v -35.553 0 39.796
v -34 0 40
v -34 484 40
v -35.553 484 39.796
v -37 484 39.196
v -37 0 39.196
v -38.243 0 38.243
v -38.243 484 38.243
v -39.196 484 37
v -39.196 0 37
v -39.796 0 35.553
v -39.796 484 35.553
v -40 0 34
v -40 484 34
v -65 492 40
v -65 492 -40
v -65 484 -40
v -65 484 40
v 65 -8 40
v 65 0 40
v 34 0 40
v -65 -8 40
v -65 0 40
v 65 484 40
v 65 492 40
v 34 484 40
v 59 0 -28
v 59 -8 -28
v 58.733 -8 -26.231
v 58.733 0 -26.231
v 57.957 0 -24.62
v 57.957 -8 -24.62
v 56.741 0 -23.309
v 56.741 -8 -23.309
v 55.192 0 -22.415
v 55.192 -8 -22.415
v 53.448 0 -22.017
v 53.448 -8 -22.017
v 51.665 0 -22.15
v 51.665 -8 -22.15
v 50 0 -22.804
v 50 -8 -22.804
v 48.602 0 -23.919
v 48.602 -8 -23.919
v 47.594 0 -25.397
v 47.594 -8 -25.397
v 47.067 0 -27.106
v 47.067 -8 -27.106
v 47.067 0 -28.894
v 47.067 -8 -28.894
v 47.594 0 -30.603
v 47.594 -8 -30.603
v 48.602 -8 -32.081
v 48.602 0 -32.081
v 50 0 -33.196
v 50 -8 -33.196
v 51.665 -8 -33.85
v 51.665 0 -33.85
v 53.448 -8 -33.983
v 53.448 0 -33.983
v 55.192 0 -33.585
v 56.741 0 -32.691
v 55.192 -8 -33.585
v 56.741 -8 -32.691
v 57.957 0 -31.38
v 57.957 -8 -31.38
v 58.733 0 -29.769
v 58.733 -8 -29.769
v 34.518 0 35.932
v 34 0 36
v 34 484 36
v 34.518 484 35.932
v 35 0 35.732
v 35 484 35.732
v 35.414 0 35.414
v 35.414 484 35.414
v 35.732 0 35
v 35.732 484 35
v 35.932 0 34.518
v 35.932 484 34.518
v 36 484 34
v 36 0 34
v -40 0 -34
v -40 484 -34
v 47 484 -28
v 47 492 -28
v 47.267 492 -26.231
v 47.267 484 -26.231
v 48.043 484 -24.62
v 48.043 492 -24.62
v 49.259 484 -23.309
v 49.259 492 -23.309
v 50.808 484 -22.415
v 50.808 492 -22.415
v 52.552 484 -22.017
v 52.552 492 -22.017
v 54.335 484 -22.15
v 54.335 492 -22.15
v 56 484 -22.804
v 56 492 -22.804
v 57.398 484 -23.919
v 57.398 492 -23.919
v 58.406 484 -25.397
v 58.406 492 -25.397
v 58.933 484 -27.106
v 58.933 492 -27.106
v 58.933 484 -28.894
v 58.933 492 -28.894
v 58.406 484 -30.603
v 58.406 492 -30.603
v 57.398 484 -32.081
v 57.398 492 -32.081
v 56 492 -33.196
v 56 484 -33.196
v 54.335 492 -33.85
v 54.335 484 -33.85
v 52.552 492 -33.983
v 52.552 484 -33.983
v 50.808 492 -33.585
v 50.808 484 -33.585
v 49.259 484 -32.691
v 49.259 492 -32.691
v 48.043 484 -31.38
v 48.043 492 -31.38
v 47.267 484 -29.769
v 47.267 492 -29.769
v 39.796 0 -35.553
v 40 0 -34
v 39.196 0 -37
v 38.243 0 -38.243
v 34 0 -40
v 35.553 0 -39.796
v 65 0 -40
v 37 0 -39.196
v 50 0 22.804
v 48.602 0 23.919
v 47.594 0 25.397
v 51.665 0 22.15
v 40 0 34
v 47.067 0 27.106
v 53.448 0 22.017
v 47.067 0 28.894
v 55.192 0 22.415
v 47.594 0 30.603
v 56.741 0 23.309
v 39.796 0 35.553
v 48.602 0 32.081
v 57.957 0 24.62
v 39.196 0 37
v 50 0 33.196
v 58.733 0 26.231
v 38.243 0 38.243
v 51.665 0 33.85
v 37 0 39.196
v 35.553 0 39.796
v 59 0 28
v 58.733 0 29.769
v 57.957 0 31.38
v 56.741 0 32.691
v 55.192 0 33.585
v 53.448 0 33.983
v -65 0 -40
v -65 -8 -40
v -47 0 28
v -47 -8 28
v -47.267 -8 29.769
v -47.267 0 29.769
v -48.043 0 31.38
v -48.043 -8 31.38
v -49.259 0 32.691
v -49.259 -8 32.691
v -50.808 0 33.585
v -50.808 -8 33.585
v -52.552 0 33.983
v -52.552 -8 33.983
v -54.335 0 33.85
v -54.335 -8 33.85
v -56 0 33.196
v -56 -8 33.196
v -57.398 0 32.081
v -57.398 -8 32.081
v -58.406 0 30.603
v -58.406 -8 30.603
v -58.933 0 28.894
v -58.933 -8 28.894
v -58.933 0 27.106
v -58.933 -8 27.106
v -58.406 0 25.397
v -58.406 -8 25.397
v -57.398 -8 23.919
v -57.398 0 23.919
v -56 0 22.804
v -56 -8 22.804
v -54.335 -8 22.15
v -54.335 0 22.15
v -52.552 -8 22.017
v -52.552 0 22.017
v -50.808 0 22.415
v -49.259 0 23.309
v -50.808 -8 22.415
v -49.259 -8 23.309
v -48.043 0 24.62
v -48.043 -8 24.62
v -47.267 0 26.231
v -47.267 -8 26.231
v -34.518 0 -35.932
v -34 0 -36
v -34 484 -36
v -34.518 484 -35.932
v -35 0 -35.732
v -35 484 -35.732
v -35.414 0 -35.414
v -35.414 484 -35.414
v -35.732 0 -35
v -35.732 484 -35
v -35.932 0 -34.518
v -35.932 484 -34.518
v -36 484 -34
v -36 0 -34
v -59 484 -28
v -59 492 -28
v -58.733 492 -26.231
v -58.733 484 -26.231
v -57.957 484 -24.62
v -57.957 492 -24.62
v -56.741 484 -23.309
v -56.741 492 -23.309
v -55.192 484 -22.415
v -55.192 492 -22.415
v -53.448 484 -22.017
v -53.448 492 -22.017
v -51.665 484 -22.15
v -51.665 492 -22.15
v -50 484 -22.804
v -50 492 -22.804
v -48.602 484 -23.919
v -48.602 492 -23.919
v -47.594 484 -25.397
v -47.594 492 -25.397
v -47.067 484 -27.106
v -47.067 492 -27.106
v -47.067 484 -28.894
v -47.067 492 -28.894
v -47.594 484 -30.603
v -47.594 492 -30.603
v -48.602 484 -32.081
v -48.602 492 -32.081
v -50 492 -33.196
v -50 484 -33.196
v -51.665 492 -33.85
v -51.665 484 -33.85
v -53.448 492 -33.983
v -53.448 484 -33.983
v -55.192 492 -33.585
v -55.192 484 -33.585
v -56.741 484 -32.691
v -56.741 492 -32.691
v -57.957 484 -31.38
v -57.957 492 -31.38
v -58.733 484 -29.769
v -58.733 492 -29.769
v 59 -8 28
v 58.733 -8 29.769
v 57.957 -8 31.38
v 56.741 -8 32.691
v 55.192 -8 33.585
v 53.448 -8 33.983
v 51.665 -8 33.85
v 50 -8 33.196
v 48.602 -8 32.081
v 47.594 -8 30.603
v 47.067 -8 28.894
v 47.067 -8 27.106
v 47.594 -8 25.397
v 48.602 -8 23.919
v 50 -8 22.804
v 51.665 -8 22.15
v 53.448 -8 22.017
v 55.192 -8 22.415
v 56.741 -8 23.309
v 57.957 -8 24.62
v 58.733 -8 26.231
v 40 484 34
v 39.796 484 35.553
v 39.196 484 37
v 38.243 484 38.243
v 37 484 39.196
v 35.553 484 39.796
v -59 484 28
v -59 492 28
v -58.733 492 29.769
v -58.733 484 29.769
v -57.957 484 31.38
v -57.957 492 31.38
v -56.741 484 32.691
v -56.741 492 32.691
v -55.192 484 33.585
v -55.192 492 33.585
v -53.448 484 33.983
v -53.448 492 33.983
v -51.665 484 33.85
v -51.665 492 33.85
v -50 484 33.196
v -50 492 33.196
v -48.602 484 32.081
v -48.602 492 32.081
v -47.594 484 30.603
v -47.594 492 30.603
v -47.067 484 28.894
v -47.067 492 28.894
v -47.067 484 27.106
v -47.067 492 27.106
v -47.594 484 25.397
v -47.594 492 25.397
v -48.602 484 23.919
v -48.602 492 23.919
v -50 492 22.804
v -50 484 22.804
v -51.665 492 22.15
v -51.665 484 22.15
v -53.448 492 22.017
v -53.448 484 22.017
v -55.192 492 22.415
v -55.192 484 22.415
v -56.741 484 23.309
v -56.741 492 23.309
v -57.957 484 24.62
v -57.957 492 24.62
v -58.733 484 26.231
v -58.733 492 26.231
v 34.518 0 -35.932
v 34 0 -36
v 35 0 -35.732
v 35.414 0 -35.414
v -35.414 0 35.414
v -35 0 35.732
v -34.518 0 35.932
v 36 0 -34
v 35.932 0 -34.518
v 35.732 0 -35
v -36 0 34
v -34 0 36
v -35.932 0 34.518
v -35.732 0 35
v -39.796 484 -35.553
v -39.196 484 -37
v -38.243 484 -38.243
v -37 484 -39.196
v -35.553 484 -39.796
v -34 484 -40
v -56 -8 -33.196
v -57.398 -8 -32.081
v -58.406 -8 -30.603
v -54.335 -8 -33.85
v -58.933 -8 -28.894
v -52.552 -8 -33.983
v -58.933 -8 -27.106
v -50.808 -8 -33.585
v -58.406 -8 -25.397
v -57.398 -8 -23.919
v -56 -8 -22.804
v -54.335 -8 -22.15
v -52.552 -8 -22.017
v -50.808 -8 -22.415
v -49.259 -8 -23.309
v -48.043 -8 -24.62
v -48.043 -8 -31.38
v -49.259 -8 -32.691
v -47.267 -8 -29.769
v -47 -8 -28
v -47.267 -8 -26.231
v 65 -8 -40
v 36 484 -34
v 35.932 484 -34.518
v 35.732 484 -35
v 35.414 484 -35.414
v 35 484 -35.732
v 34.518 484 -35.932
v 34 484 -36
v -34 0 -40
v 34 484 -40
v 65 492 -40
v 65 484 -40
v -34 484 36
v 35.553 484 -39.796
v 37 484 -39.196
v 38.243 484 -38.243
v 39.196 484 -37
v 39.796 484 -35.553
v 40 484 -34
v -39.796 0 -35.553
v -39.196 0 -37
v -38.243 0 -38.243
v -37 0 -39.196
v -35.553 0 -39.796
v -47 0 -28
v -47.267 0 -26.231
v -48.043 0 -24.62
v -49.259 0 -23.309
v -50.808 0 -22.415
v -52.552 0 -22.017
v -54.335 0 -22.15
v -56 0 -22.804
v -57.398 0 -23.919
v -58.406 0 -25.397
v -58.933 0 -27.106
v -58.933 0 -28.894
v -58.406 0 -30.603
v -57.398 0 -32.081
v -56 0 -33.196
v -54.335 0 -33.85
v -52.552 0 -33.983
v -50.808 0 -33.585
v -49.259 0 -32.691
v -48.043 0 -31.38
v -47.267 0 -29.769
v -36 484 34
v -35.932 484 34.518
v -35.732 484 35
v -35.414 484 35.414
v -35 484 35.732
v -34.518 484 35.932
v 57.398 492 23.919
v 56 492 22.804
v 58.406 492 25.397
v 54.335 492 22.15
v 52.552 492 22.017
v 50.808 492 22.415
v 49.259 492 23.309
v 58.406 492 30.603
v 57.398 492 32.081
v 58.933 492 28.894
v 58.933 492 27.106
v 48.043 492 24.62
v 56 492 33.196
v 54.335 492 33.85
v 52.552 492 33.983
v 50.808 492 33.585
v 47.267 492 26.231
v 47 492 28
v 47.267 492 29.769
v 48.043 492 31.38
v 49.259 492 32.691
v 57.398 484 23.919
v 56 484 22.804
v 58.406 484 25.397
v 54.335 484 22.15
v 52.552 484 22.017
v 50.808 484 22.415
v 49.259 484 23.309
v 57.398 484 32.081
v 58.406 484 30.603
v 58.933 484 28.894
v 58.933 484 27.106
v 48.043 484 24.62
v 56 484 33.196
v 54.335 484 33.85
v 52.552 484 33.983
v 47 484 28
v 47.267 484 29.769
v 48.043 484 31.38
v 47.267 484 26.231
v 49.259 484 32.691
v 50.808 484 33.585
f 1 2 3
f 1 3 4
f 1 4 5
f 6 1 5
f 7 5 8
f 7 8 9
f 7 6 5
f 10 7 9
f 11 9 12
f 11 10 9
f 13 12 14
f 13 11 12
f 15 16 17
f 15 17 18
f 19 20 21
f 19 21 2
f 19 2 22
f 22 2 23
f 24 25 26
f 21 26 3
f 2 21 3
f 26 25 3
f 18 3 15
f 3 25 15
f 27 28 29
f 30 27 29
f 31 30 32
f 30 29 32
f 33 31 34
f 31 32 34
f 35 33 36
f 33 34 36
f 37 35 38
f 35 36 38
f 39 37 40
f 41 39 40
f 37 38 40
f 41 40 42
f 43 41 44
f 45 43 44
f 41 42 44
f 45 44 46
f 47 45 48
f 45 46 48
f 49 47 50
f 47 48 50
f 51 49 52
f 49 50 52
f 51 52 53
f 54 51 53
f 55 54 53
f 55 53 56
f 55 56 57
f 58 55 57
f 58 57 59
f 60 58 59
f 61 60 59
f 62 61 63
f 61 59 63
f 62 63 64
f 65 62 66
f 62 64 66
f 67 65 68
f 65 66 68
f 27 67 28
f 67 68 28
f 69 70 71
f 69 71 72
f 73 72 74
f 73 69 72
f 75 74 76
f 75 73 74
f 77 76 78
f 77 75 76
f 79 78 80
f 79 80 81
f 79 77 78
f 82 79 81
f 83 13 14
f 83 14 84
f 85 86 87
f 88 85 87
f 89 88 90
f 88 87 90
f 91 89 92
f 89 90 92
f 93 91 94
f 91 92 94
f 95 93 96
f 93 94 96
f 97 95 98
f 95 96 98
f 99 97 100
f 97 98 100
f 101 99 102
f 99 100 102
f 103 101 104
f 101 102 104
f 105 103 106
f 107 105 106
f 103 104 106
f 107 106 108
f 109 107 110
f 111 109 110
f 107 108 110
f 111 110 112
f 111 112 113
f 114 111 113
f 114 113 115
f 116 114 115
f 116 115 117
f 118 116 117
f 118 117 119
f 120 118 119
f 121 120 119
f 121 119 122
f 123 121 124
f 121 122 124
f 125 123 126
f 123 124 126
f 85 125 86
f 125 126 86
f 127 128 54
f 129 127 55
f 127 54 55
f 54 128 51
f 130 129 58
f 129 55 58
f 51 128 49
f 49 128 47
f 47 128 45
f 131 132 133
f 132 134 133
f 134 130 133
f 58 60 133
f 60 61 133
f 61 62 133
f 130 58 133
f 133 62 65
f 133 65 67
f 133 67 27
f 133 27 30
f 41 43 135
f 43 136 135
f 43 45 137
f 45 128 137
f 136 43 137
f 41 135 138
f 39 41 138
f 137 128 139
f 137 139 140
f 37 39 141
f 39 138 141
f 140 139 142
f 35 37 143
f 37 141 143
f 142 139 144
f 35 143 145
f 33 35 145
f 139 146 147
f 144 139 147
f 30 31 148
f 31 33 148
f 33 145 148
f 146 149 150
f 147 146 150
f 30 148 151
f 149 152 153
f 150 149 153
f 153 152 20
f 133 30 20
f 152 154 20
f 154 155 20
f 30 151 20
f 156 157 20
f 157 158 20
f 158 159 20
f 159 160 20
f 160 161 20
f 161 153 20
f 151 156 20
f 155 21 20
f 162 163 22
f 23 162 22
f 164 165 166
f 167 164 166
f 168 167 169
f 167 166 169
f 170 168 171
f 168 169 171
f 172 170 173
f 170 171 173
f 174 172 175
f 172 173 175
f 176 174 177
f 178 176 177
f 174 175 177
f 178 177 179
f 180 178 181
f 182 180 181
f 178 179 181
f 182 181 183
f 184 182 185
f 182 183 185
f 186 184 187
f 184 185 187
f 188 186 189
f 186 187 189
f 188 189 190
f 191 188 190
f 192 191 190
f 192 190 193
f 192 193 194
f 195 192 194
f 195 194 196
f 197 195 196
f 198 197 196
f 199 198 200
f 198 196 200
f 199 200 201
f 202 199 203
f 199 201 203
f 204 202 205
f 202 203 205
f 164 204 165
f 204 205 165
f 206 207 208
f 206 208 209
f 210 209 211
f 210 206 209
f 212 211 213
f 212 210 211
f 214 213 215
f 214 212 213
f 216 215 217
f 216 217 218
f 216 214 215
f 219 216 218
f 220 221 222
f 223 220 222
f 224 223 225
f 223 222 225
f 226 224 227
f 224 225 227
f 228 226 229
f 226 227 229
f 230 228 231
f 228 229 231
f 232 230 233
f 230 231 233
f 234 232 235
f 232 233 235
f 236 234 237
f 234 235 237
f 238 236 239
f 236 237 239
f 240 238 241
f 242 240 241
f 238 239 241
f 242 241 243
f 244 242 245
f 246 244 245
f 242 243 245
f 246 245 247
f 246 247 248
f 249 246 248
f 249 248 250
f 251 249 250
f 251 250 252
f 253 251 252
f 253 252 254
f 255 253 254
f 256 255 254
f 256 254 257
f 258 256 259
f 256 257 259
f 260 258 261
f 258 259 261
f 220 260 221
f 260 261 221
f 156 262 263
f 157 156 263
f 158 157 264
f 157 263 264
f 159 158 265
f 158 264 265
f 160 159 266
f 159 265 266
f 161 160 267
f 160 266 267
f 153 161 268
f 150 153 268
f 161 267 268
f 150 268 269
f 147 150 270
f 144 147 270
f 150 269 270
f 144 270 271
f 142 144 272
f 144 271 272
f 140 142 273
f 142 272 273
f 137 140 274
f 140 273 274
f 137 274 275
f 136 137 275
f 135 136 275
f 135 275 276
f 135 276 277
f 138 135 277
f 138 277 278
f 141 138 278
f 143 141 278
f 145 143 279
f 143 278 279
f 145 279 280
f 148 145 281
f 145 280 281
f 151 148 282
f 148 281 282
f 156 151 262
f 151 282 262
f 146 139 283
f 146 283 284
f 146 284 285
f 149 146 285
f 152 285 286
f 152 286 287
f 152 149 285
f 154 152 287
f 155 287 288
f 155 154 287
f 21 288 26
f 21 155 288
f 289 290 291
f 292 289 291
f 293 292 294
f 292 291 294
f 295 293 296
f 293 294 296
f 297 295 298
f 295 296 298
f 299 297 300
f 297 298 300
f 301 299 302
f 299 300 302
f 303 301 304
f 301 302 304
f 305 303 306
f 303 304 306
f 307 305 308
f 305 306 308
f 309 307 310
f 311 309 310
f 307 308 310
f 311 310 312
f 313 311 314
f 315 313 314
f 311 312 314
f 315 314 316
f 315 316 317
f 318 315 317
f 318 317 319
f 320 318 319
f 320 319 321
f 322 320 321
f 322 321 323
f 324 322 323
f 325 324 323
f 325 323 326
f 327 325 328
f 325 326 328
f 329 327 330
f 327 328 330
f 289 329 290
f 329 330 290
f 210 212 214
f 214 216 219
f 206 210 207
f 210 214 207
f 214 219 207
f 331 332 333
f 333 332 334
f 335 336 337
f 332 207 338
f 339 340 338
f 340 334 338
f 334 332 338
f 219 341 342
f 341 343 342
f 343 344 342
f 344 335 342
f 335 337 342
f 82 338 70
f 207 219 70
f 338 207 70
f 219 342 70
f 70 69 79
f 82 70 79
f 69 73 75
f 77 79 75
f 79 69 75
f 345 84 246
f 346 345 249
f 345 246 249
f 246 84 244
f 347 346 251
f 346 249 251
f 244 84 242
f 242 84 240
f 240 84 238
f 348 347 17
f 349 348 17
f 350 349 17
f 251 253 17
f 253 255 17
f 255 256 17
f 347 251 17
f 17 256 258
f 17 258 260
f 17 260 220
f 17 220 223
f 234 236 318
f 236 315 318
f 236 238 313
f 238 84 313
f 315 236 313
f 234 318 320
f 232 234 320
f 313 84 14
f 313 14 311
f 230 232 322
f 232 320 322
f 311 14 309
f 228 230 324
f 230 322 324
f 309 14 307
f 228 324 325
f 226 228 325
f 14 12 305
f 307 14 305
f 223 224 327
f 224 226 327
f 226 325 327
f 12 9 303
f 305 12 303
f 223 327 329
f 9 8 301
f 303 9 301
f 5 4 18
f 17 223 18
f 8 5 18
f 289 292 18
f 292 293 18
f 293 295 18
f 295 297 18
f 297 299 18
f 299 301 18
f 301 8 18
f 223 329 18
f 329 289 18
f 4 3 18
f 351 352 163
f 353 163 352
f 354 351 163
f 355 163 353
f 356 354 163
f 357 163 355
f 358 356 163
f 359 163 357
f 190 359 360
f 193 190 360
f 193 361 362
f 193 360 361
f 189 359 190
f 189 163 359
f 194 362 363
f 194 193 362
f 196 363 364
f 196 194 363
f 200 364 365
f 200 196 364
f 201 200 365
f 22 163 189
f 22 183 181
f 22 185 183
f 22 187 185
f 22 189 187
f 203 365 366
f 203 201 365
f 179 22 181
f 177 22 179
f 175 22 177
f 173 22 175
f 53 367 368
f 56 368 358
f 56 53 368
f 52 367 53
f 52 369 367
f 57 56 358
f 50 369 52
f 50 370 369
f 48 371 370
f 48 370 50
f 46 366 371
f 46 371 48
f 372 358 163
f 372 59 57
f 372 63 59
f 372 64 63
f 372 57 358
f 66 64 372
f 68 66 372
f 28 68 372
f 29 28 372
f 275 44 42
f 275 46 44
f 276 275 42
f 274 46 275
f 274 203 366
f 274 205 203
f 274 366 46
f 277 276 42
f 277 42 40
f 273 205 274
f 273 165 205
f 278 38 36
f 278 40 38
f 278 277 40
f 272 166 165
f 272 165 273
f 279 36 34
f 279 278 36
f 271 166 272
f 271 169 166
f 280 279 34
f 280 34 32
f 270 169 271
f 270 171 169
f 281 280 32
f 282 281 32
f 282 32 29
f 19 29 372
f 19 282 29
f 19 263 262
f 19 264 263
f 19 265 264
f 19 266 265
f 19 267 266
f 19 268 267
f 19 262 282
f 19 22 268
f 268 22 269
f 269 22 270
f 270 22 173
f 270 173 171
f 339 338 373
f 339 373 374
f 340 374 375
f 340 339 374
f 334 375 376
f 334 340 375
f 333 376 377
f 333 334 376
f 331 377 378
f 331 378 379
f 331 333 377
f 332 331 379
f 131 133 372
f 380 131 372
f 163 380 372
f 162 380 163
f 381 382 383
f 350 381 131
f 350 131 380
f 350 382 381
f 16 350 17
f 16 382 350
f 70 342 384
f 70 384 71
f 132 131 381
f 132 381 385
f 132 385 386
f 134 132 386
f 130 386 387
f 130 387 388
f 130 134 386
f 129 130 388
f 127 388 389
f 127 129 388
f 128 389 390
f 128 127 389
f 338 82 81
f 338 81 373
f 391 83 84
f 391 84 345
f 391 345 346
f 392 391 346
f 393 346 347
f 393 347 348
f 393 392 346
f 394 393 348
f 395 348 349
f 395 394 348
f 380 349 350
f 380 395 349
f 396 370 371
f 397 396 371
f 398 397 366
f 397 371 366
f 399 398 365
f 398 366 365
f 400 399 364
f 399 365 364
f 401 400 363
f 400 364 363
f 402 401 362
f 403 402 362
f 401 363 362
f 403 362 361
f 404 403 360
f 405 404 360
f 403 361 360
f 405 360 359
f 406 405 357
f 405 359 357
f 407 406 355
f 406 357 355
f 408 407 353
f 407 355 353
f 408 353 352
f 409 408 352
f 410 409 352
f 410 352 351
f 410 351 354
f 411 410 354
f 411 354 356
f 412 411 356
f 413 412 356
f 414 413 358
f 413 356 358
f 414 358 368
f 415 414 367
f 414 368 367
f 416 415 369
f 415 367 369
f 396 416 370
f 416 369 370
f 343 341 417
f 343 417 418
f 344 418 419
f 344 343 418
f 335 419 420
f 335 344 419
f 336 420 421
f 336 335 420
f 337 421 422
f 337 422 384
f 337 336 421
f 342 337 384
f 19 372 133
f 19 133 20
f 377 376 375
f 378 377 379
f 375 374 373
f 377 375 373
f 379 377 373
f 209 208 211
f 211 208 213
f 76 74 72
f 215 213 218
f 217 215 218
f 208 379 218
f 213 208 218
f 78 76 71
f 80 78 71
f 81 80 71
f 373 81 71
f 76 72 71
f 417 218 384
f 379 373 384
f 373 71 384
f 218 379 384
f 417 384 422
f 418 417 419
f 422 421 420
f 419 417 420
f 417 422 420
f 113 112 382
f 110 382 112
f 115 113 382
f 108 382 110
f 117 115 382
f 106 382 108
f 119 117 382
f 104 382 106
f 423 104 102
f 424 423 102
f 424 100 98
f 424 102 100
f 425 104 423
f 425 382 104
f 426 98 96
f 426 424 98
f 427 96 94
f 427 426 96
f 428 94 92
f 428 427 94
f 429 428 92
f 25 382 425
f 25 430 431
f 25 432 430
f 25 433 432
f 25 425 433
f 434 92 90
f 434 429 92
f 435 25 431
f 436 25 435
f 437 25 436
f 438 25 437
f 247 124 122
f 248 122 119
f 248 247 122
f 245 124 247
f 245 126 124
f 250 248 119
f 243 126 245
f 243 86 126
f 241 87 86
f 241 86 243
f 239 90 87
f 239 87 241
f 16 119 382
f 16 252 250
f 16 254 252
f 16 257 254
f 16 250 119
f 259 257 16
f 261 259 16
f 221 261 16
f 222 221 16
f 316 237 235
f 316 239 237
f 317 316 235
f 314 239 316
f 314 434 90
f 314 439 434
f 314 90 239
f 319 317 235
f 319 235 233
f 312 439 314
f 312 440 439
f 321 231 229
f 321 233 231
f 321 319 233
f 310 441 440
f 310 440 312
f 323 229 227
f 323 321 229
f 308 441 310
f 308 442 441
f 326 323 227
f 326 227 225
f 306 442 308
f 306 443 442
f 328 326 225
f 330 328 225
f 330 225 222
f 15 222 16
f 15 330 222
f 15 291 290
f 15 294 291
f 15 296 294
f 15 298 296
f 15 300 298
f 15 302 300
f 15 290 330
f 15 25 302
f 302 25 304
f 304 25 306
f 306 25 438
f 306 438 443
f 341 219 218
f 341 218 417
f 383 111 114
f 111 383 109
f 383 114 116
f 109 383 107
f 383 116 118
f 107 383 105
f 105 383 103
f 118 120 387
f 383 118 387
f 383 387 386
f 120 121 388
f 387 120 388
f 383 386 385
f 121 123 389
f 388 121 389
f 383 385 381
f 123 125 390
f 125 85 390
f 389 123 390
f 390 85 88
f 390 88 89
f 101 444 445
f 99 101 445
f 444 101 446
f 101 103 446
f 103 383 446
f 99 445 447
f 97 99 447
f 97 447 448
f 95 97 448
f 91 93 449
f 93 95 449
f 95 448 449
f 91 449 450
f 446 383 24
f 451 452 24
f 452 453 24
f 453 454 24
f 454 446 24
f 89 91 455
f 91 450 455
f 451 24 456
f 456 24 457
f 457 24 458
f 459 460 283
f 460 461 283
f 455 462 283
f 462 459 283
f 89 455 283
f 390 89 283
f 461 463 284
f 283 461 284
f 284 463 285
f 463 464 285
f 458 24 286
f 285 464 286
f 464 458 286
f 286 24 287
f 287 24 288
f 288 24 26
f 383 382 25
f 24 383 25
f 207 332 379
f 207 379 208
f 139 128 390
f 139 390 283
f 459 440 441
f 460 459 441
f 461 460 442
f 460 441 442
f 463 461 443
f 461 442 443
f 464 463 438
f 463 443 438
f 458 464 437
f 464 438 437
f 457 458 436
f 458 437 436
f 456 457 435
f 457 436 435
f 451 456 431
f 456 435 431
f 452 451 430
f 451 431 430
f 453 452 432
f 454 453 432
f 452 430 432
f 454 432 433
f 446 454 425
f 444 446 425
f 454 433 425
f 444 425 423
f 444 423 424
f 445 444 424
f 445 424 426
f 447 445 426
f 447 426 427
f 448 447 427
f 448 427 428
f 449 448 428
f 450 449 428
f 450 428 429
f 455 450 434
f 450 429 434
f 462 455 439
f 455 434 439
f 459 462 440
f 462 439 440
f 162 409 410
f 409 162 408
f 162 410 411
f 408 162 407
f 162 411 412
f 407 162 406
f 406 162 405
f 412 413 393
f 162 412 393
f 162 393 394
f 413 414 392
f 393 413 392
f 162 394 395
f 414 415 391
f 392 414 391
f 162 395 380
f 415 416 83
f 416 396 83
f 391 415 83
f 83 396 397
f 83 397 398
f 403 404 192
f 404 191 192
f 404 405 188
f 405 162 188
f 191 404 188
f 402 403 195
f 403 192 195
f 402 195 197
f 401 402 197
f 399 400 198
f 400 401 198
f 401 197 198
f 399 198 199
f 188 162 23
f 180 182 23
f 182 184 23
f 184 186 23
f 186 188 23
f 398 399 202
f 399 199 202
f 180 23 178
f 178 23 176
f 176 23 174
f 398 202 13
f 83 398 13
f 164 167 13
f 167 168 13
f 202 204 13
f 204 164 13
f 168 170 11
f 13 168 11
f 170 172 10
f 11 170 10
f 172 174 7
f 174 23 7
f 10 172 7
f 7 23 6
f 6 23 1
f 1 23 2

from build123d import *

# Parameters (mm, degrees)
F1_DEPTH = 484
F3_W     = 130
F3_H     = 80
F3_R     = 6
F4_DEPTH = 8
F6_W     = 130
F6_H     = 80
F6_R     = 6
F7_DEPTH = 8


with BuildPart() as f1:
    # F0 (on Front) → F1 (new body)
    with BuildSketch(Plane.XZ):
        with BuildLine():
            ThreePointArc((40, 34), (38.2426406871, 38.2426406871), (34, 40))
            Line((34, 40), (-34, 40))
            ThreePointArc((-34, 40), (-38.2426406871, 38.2426406871), (-40, 34))
            Line((-40, 34), (-40, -34))
            ThreePointArc((-40, -34), (-38.2426406871, -38.2426406871), (-34, -40))
            Line((-34, -40), (34, -40))
            ThreePointArc((34, -40), (38.2426406871, -38.2426406871), (40, -34))
            Line((40, -34), (40, 34))
        make_face()
        with BuildLine():
            ThreePointArc((-36, 34), (-35.4142135624, 35.4142135624), (-34, 36))
            Line((-34, 36), (34, 36))
            ThreePointArc((34, 36), (35.4142135624, 35.4142135624), (36, 34))
            Line((36, 34), (36, -34))
            ThreePointArc((36, -34), (35.4142135624, -35.4142135624), (34, -36))
            Line((34, -36), (-34, -36))
            ThreePointArc((-34, -36), (-35.4142135624, -35.4142135624), (-36, -34))
            Line((-36, -34), (-36, 34))
        make_face(mode=Mode.SUBTRACT)
    extrude(amount=-F1_DEPTH)

    # F3 (on offset) → F4 (join)
    with BuildSketch(Plane.XZ.offset(8)):
        Rectangle(F3_W, F3_H)
        with Locations((-53, -28)):
            Circle(F3_R, mode=Mode.SUBTRACT)
        with Locations((53, -28)):
            Circle(F3_R, mode=Mode.SUBTRACT)
        with Locations((-53, 28)):
            Circle(F3_R, mode=Mode.SUBTRACT)
        with Locations((53, 28)):
            Circle(F3_R, mode=Mode.SUBTRACT)
    extrude(amount=-F4_DEPTH)

    # F6 (on offset) → F7 (join)
    with BuildSketch(Plane(origin=(0, 492, 0), x_dir=(-1, 0, 0), z_dir=(0, 1, 0))):
        Rectangle(F6_W, F6_H)
        with Locations((-53, -28)):
            Circle(F6_R, mode=Mode.SUBTRACT)
        with Locations((53, -28)):
            Circle(F6_R, mode=Mode.SUBTRACT)
        with Locations((-53, 28)):
            Circle(F6_R, mode=Mode.SUBTRACT)
        with Locations((53, 28)):
            Circle(F6_R, mode=Mode.SUBTRACT)
    extrude(amount=-F7_DEPTH)


solid = f1.part
